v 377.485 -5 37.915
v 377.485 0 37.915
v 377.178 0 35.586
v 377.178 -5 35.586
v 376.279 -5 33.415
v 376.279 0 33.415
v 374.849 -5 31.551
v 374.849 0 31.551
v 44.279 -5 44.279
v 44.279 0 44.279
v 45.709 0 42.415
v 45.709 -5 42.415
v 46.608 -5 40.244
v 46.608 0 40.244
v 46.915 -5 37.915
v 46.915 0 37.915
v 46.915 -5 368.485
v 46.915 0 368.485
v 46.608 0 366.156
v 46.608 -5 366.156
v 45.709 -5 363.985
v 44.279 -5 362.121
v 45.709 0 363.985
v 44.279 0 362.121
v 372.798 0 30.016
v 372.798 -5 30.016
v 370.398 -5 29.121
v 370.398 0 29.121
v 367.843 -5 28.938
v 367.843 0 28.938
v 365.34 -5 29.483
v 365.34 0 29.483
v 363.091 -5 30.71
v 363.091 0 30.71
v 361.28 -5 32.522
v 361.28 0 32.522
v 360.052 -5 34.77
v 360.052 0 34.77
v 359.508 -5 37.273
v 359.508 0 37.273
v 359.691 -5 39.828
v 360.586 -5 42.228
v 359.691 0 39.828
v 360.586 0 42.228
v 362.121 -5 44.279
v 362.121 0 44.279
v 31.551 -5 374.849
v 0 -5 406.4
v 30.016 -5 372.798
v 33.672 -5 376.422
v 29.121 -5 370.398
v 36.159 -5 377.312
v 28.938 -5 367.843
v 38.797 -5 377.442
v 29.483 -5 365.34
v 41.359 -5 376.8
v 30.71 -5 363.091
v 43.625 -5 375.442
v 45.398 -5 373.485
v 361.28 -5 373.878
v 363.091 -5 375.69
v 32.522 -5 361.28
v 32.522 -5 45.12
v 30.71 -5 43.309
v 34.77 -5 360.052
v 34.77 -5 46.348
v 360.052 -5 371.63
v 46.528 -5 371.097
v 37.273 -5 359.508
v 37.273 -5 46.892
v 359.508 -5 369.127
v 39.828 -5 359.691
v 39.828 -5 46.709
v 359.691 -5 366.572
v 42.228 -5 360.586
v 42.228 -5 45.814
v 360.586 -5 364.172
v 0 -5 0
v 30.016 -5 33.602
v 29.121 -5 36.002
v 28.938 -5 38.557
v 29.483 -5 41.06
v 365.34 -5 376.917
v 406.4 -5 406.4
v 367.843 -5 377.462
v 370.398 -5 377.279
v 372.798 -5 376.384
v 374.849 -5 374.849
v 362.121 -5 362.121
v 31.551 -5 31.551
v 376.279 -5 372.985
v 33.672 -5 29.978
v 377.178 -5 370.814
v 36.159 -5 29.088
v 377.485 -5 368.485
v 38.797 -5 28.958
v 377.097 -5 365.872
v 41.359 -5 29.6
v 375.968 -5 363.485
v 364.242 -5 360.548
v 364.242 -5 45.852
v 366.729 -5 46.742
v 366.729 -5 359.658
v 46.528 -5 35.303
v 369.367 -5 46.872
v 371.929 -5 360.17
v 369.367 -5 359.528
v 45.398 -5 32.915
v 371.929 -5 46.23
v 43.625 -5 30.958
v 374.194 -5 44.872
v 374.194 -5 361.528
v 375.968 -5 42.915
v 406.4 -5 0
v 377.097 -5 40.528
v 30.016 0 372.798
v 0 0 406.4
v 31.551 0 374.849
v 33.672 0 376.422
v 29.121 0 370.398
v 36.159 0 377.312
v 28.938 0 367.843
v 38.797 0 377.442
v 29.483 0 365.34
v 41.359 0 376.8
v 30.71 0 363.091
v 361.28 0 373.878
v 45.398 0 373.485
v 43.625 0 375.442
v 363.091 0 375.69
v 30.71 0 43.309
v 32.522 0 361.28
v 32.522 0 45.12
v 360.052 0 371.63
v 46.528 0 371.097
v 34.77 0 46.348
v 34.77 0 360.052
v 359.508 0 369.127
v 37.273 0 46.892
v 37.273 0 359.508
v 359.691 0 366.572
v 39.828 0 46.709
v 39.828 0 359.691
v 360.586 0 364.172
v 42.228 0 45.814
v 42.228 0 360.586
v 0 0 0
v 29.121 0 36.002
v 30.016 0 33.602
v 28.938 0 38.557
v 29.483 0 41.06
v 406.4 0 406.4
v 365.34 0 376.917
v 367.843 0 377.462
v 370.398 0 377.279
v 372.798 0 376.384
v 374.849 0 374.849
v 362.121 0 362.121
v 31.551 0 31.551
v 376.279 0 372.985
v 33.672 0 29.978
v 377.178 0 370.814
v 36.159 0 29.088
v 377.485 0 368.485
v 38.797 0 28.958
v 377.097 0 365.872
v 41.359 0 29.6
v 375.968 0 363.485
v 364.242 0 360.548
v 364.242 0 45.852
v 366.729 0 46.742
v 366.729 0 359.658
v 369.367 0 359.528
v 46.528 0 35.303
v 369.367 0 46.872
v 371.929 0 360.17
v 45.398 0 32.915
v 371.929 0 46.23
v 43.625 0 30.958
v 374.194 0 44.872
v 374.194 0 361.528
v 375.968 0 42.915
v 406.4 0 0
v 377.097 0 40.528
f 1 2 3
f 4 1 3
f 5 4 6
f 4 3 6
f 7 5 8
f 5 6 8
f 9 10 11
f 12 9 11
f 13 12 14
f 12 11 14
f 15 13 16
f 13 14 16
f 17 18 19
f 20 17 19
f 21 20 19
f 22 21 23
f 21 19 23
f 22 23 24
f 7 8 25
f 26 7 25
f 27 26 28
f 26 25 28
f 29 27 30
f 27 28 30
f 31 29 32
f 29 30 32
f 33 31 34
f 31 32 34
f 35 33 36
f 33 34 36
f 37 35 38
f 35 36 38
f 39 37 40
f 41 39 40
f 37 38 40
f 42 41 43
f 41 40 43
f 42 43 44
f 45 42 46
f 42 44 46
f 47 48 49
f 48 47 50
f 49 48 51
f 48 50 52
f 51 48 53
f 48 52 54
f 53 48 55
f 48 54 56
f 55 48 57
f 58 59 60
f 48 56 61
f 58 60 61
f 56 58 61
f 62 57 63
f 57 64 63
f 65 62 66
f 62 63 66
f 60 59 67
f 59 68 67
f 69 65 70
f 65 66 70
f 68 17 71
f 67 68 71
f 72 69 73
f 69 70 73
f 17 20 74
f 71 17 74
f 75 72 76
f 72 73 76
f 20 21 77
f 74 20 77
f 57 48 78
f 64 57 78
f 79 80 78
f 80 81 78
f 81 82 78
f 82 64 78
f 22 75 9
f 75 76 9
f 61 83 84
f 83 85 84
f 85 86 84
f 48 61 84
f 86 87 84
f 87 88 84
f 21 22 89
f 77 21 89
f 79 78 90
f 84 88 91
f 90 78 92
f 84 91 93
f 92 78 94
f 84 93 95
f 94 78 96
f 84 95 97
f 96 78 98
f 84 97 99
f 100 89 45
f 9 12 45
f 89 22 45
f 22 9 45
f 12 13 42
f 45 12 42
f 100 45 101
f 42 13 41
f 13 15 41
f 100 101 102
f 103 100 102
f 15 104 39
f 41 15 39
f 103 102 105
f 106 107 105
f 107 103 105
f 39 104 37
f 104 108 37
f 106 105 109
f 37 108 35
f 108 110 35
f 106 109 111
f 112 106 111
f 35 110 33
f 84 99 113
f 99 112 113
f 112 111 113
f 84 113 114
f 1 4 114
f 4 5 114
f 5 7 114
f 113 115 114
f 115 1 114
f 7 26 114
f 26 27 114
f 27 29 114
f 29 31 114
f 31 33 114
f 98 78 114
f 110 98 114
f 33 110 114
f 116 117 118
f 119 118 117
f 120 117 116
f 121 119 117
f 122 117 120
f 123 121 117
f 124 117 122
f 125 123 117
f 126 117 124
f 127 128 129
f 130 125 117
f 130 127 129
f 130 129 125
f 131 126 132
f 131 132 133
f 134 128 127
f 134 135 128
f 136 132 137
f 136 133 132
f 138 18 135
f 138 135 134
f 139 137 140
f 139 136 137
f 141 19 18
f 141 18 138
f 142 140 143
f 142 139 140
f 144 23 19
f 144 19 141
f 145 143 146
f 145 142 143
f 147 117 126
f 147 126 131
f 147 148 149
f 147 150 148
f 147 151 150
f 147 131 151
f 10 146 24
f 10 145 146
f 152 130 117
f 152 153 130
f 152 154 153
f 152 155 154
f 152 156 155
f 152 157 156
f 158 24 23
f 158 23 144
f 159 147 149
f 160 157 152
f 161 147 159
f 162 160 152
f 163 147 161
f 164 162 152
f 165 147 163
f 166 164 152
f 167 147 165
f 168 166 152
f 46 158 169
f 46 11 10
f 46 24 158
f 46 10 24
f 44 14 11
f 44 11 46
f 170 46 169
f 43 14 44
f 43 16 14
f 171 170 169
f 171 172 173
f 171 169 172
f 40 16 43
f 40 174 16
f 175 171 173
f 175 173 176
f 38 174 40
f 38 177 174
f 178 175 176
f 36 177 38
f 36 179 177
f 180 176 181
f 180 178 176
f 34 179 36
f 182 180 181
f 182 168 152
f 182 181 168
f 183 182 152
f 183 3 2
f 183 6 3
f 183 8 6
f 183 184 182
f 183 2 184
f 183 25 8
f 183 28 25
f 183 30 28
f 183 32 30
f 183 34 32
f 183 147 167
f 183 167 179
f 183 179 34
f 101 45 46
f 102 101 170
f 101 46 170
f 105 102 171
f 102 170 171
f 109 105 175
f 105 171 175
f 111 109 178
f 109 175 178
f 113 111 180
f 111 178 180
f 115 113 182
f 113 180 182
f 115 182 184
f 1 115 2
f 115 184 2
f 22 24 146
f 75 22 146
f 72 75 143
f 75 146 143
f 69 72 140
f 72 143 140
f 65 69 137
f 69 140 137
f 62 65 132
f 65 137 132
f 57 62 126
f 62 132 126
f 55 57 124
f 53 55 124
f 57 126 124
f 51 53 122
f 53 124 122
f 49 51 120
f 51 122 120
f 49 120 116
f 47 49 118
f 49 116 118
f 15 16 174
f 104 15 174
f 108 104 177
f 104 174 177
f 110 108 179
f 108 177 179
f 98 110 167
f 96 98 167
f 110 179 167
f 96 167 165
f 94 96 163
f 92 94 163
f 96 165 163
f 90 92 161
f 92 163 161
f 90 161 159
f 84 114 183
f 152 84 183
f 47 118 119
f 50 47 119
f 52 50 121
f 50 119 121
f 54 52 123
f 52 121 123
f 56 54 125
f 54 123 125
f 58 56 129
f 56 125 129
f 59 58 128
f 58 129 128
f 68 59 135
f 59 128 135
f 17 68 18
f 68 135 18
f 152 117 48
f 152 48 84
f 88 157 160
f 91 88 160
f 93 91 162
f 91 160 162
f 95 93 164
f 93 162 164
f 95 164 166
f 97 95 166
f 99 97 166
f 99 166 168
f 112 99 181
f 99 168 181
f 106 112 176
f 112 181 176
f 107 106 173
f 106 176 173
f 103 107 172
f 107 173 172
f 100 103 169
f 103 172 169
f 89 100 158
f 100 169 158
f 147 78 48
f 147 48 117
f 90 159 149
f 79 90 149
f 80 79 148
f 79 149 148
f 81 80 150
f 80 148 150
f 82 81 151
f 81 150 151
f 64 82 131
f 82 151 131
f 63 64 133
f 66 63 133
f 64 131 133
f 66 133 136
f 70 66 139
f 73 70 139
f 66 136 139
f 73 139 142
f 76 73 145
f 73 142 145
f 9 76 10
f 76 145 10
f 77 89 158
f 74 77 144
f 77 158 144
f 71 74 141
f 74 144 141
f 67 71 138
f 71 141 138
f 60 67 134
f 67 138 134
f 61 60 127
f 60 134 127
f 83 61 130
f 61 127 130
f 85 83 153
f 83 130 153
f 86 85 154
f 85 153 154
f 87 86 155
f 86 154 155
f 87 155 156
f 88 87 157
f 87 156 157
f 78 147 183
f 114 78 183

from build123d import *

# Parameters (mm, degrees)
SKETCH1_W          = 406.4
SKETCH1_H          = 5
BASE_FLANGE1_DEPTH = 406.4
CUT_EXTRUDE1_DEPTH = 575.758140438


# Sheet-metal steps are written as plain solids
with BuildPart() as part:
    # Sketch1 → Base-Flange1 (new body)
    with BuildSketch(Plane.XY):
        with Locations((203.2, -2.5)):
            Rectangle(SKETCH1_W, SKETCH1_H)
    extrude(amount=BASE_FLANGE1_DEPTH)

    # Sketch6 → Cut-Extrude1 (cut, through all)
    with BuildSketch(Plane(origin=(0, 0, 0), x_dir=(1, 0, 0), z_dir=(0, 1, 0))):
        with BuildLine():
            ThreePointArc((46.915065607, -37.915065607), (41.359216499, -29.600149815), (31.551104577, -31.551104577))
            Line((31.551104577, -31.551104577), (37.915065607, -37.915065607))
            Line((37.915065607, -37.915065607), (44.279026638, -44.279026638))
            ThreePointArc((44.279026638, -44.279026638), (46.2299814, -41.359216499), (46.915065607, -37.915065607))
        make_face()
        with BuildLine():
            Line((37.915065607, -37.915065607), (31.551104577, -31.551104577))
            ThreePointArc((31.551104577, -31.551104577), (31.551104577, -44.279026638), (44.279026638, -44.279026638))
            Line((44.279026638, -44.279026638), (37.915065607, -37.915065607))
        make_face()
        with BuildLine():
            ThreePointArc((377.484934393, -37.915065607), (376.799850185, -34.470914716), (374.848895423, -31.551104577))
            Line((374.848895423, -31.551104577), (368.484934393, -37.915065607))
            Line((368.484934393, -37.915065607), (362.120973362, -44.279026638))
            ThreePointArc((362.120973362, -44.279026638), (371.929085284, -46.2299814), (377.484934393, -37.915065607))
        make_face()
        with BuildLine():
            Line((368.484934393, -37.915065607), (374.848895423, -31.551104577))
            ThreePointArc((374.848895423, -31.551104577), (362.120973362, -31.551104577), (362.120973362, -44.279026638))
            Line((362.120973362, -44.279026638), (368.484934393, -37.915065607))
        make_face()
        with BuildLine():
            ThreePointArc((362.120973362, -362.120973362), (362.120973362, -374.848895423), (374.848895423, -374.848895423))
            Line((374.848895423, -374.848895423), (368.484934393, -368.484934393))
            Line((368.484934393, -368.484934393), (362.120973362, -362.120973362))
        make_face()
        with BuildLine():
            Line((368.484934393, -368.484934393), (374.848895423, -374.848895423))
            ThreePointArc((374.848895423, -374.848895423), (376.799850185, -371.929085284), (377.484934393, -368.484934393))
            ThreePointArc((377.484934393, -368.484934393), (371.929085284, -360.1700186), (362.120973362, -362.120973362))
            Line((362.120973362, -362.120973362), (368.484934393, -368.484934393))
        make_face()
        with BuildLine():
            ThreePointArc((44.279026638, -362.120973362), (31.551104577, -362.120973362), (31.551104577, -374.848895423))
            Line((31.551104577, -374.848895423), (37.915065607, -368.484934393))
            Line((37.915065607, -368.484934393), (44.279026638, -362.120973362))
        make_face()
        with BuildLine():
            Line((37.915065607, -368.484934393), (31.551104577, -374.848895423))
            ThreePointArc((31.551104577, -374.848895423), (41.359216499, -376.799850185), (46.915065607, -368.484934393))
            ThreePointArc((46.915065607, -368.484934393), (46.2299814, -365.040783501), (44.279026638, -362.120973362))
            Line((44.279026638, -362.120973362), (37.915065607, -368.484934393))
        make_face()
    extrude(amount=-CUT_EXTRUDE1_DEPTH, mode=Mode.SUBTRACT)


solid = part.part
